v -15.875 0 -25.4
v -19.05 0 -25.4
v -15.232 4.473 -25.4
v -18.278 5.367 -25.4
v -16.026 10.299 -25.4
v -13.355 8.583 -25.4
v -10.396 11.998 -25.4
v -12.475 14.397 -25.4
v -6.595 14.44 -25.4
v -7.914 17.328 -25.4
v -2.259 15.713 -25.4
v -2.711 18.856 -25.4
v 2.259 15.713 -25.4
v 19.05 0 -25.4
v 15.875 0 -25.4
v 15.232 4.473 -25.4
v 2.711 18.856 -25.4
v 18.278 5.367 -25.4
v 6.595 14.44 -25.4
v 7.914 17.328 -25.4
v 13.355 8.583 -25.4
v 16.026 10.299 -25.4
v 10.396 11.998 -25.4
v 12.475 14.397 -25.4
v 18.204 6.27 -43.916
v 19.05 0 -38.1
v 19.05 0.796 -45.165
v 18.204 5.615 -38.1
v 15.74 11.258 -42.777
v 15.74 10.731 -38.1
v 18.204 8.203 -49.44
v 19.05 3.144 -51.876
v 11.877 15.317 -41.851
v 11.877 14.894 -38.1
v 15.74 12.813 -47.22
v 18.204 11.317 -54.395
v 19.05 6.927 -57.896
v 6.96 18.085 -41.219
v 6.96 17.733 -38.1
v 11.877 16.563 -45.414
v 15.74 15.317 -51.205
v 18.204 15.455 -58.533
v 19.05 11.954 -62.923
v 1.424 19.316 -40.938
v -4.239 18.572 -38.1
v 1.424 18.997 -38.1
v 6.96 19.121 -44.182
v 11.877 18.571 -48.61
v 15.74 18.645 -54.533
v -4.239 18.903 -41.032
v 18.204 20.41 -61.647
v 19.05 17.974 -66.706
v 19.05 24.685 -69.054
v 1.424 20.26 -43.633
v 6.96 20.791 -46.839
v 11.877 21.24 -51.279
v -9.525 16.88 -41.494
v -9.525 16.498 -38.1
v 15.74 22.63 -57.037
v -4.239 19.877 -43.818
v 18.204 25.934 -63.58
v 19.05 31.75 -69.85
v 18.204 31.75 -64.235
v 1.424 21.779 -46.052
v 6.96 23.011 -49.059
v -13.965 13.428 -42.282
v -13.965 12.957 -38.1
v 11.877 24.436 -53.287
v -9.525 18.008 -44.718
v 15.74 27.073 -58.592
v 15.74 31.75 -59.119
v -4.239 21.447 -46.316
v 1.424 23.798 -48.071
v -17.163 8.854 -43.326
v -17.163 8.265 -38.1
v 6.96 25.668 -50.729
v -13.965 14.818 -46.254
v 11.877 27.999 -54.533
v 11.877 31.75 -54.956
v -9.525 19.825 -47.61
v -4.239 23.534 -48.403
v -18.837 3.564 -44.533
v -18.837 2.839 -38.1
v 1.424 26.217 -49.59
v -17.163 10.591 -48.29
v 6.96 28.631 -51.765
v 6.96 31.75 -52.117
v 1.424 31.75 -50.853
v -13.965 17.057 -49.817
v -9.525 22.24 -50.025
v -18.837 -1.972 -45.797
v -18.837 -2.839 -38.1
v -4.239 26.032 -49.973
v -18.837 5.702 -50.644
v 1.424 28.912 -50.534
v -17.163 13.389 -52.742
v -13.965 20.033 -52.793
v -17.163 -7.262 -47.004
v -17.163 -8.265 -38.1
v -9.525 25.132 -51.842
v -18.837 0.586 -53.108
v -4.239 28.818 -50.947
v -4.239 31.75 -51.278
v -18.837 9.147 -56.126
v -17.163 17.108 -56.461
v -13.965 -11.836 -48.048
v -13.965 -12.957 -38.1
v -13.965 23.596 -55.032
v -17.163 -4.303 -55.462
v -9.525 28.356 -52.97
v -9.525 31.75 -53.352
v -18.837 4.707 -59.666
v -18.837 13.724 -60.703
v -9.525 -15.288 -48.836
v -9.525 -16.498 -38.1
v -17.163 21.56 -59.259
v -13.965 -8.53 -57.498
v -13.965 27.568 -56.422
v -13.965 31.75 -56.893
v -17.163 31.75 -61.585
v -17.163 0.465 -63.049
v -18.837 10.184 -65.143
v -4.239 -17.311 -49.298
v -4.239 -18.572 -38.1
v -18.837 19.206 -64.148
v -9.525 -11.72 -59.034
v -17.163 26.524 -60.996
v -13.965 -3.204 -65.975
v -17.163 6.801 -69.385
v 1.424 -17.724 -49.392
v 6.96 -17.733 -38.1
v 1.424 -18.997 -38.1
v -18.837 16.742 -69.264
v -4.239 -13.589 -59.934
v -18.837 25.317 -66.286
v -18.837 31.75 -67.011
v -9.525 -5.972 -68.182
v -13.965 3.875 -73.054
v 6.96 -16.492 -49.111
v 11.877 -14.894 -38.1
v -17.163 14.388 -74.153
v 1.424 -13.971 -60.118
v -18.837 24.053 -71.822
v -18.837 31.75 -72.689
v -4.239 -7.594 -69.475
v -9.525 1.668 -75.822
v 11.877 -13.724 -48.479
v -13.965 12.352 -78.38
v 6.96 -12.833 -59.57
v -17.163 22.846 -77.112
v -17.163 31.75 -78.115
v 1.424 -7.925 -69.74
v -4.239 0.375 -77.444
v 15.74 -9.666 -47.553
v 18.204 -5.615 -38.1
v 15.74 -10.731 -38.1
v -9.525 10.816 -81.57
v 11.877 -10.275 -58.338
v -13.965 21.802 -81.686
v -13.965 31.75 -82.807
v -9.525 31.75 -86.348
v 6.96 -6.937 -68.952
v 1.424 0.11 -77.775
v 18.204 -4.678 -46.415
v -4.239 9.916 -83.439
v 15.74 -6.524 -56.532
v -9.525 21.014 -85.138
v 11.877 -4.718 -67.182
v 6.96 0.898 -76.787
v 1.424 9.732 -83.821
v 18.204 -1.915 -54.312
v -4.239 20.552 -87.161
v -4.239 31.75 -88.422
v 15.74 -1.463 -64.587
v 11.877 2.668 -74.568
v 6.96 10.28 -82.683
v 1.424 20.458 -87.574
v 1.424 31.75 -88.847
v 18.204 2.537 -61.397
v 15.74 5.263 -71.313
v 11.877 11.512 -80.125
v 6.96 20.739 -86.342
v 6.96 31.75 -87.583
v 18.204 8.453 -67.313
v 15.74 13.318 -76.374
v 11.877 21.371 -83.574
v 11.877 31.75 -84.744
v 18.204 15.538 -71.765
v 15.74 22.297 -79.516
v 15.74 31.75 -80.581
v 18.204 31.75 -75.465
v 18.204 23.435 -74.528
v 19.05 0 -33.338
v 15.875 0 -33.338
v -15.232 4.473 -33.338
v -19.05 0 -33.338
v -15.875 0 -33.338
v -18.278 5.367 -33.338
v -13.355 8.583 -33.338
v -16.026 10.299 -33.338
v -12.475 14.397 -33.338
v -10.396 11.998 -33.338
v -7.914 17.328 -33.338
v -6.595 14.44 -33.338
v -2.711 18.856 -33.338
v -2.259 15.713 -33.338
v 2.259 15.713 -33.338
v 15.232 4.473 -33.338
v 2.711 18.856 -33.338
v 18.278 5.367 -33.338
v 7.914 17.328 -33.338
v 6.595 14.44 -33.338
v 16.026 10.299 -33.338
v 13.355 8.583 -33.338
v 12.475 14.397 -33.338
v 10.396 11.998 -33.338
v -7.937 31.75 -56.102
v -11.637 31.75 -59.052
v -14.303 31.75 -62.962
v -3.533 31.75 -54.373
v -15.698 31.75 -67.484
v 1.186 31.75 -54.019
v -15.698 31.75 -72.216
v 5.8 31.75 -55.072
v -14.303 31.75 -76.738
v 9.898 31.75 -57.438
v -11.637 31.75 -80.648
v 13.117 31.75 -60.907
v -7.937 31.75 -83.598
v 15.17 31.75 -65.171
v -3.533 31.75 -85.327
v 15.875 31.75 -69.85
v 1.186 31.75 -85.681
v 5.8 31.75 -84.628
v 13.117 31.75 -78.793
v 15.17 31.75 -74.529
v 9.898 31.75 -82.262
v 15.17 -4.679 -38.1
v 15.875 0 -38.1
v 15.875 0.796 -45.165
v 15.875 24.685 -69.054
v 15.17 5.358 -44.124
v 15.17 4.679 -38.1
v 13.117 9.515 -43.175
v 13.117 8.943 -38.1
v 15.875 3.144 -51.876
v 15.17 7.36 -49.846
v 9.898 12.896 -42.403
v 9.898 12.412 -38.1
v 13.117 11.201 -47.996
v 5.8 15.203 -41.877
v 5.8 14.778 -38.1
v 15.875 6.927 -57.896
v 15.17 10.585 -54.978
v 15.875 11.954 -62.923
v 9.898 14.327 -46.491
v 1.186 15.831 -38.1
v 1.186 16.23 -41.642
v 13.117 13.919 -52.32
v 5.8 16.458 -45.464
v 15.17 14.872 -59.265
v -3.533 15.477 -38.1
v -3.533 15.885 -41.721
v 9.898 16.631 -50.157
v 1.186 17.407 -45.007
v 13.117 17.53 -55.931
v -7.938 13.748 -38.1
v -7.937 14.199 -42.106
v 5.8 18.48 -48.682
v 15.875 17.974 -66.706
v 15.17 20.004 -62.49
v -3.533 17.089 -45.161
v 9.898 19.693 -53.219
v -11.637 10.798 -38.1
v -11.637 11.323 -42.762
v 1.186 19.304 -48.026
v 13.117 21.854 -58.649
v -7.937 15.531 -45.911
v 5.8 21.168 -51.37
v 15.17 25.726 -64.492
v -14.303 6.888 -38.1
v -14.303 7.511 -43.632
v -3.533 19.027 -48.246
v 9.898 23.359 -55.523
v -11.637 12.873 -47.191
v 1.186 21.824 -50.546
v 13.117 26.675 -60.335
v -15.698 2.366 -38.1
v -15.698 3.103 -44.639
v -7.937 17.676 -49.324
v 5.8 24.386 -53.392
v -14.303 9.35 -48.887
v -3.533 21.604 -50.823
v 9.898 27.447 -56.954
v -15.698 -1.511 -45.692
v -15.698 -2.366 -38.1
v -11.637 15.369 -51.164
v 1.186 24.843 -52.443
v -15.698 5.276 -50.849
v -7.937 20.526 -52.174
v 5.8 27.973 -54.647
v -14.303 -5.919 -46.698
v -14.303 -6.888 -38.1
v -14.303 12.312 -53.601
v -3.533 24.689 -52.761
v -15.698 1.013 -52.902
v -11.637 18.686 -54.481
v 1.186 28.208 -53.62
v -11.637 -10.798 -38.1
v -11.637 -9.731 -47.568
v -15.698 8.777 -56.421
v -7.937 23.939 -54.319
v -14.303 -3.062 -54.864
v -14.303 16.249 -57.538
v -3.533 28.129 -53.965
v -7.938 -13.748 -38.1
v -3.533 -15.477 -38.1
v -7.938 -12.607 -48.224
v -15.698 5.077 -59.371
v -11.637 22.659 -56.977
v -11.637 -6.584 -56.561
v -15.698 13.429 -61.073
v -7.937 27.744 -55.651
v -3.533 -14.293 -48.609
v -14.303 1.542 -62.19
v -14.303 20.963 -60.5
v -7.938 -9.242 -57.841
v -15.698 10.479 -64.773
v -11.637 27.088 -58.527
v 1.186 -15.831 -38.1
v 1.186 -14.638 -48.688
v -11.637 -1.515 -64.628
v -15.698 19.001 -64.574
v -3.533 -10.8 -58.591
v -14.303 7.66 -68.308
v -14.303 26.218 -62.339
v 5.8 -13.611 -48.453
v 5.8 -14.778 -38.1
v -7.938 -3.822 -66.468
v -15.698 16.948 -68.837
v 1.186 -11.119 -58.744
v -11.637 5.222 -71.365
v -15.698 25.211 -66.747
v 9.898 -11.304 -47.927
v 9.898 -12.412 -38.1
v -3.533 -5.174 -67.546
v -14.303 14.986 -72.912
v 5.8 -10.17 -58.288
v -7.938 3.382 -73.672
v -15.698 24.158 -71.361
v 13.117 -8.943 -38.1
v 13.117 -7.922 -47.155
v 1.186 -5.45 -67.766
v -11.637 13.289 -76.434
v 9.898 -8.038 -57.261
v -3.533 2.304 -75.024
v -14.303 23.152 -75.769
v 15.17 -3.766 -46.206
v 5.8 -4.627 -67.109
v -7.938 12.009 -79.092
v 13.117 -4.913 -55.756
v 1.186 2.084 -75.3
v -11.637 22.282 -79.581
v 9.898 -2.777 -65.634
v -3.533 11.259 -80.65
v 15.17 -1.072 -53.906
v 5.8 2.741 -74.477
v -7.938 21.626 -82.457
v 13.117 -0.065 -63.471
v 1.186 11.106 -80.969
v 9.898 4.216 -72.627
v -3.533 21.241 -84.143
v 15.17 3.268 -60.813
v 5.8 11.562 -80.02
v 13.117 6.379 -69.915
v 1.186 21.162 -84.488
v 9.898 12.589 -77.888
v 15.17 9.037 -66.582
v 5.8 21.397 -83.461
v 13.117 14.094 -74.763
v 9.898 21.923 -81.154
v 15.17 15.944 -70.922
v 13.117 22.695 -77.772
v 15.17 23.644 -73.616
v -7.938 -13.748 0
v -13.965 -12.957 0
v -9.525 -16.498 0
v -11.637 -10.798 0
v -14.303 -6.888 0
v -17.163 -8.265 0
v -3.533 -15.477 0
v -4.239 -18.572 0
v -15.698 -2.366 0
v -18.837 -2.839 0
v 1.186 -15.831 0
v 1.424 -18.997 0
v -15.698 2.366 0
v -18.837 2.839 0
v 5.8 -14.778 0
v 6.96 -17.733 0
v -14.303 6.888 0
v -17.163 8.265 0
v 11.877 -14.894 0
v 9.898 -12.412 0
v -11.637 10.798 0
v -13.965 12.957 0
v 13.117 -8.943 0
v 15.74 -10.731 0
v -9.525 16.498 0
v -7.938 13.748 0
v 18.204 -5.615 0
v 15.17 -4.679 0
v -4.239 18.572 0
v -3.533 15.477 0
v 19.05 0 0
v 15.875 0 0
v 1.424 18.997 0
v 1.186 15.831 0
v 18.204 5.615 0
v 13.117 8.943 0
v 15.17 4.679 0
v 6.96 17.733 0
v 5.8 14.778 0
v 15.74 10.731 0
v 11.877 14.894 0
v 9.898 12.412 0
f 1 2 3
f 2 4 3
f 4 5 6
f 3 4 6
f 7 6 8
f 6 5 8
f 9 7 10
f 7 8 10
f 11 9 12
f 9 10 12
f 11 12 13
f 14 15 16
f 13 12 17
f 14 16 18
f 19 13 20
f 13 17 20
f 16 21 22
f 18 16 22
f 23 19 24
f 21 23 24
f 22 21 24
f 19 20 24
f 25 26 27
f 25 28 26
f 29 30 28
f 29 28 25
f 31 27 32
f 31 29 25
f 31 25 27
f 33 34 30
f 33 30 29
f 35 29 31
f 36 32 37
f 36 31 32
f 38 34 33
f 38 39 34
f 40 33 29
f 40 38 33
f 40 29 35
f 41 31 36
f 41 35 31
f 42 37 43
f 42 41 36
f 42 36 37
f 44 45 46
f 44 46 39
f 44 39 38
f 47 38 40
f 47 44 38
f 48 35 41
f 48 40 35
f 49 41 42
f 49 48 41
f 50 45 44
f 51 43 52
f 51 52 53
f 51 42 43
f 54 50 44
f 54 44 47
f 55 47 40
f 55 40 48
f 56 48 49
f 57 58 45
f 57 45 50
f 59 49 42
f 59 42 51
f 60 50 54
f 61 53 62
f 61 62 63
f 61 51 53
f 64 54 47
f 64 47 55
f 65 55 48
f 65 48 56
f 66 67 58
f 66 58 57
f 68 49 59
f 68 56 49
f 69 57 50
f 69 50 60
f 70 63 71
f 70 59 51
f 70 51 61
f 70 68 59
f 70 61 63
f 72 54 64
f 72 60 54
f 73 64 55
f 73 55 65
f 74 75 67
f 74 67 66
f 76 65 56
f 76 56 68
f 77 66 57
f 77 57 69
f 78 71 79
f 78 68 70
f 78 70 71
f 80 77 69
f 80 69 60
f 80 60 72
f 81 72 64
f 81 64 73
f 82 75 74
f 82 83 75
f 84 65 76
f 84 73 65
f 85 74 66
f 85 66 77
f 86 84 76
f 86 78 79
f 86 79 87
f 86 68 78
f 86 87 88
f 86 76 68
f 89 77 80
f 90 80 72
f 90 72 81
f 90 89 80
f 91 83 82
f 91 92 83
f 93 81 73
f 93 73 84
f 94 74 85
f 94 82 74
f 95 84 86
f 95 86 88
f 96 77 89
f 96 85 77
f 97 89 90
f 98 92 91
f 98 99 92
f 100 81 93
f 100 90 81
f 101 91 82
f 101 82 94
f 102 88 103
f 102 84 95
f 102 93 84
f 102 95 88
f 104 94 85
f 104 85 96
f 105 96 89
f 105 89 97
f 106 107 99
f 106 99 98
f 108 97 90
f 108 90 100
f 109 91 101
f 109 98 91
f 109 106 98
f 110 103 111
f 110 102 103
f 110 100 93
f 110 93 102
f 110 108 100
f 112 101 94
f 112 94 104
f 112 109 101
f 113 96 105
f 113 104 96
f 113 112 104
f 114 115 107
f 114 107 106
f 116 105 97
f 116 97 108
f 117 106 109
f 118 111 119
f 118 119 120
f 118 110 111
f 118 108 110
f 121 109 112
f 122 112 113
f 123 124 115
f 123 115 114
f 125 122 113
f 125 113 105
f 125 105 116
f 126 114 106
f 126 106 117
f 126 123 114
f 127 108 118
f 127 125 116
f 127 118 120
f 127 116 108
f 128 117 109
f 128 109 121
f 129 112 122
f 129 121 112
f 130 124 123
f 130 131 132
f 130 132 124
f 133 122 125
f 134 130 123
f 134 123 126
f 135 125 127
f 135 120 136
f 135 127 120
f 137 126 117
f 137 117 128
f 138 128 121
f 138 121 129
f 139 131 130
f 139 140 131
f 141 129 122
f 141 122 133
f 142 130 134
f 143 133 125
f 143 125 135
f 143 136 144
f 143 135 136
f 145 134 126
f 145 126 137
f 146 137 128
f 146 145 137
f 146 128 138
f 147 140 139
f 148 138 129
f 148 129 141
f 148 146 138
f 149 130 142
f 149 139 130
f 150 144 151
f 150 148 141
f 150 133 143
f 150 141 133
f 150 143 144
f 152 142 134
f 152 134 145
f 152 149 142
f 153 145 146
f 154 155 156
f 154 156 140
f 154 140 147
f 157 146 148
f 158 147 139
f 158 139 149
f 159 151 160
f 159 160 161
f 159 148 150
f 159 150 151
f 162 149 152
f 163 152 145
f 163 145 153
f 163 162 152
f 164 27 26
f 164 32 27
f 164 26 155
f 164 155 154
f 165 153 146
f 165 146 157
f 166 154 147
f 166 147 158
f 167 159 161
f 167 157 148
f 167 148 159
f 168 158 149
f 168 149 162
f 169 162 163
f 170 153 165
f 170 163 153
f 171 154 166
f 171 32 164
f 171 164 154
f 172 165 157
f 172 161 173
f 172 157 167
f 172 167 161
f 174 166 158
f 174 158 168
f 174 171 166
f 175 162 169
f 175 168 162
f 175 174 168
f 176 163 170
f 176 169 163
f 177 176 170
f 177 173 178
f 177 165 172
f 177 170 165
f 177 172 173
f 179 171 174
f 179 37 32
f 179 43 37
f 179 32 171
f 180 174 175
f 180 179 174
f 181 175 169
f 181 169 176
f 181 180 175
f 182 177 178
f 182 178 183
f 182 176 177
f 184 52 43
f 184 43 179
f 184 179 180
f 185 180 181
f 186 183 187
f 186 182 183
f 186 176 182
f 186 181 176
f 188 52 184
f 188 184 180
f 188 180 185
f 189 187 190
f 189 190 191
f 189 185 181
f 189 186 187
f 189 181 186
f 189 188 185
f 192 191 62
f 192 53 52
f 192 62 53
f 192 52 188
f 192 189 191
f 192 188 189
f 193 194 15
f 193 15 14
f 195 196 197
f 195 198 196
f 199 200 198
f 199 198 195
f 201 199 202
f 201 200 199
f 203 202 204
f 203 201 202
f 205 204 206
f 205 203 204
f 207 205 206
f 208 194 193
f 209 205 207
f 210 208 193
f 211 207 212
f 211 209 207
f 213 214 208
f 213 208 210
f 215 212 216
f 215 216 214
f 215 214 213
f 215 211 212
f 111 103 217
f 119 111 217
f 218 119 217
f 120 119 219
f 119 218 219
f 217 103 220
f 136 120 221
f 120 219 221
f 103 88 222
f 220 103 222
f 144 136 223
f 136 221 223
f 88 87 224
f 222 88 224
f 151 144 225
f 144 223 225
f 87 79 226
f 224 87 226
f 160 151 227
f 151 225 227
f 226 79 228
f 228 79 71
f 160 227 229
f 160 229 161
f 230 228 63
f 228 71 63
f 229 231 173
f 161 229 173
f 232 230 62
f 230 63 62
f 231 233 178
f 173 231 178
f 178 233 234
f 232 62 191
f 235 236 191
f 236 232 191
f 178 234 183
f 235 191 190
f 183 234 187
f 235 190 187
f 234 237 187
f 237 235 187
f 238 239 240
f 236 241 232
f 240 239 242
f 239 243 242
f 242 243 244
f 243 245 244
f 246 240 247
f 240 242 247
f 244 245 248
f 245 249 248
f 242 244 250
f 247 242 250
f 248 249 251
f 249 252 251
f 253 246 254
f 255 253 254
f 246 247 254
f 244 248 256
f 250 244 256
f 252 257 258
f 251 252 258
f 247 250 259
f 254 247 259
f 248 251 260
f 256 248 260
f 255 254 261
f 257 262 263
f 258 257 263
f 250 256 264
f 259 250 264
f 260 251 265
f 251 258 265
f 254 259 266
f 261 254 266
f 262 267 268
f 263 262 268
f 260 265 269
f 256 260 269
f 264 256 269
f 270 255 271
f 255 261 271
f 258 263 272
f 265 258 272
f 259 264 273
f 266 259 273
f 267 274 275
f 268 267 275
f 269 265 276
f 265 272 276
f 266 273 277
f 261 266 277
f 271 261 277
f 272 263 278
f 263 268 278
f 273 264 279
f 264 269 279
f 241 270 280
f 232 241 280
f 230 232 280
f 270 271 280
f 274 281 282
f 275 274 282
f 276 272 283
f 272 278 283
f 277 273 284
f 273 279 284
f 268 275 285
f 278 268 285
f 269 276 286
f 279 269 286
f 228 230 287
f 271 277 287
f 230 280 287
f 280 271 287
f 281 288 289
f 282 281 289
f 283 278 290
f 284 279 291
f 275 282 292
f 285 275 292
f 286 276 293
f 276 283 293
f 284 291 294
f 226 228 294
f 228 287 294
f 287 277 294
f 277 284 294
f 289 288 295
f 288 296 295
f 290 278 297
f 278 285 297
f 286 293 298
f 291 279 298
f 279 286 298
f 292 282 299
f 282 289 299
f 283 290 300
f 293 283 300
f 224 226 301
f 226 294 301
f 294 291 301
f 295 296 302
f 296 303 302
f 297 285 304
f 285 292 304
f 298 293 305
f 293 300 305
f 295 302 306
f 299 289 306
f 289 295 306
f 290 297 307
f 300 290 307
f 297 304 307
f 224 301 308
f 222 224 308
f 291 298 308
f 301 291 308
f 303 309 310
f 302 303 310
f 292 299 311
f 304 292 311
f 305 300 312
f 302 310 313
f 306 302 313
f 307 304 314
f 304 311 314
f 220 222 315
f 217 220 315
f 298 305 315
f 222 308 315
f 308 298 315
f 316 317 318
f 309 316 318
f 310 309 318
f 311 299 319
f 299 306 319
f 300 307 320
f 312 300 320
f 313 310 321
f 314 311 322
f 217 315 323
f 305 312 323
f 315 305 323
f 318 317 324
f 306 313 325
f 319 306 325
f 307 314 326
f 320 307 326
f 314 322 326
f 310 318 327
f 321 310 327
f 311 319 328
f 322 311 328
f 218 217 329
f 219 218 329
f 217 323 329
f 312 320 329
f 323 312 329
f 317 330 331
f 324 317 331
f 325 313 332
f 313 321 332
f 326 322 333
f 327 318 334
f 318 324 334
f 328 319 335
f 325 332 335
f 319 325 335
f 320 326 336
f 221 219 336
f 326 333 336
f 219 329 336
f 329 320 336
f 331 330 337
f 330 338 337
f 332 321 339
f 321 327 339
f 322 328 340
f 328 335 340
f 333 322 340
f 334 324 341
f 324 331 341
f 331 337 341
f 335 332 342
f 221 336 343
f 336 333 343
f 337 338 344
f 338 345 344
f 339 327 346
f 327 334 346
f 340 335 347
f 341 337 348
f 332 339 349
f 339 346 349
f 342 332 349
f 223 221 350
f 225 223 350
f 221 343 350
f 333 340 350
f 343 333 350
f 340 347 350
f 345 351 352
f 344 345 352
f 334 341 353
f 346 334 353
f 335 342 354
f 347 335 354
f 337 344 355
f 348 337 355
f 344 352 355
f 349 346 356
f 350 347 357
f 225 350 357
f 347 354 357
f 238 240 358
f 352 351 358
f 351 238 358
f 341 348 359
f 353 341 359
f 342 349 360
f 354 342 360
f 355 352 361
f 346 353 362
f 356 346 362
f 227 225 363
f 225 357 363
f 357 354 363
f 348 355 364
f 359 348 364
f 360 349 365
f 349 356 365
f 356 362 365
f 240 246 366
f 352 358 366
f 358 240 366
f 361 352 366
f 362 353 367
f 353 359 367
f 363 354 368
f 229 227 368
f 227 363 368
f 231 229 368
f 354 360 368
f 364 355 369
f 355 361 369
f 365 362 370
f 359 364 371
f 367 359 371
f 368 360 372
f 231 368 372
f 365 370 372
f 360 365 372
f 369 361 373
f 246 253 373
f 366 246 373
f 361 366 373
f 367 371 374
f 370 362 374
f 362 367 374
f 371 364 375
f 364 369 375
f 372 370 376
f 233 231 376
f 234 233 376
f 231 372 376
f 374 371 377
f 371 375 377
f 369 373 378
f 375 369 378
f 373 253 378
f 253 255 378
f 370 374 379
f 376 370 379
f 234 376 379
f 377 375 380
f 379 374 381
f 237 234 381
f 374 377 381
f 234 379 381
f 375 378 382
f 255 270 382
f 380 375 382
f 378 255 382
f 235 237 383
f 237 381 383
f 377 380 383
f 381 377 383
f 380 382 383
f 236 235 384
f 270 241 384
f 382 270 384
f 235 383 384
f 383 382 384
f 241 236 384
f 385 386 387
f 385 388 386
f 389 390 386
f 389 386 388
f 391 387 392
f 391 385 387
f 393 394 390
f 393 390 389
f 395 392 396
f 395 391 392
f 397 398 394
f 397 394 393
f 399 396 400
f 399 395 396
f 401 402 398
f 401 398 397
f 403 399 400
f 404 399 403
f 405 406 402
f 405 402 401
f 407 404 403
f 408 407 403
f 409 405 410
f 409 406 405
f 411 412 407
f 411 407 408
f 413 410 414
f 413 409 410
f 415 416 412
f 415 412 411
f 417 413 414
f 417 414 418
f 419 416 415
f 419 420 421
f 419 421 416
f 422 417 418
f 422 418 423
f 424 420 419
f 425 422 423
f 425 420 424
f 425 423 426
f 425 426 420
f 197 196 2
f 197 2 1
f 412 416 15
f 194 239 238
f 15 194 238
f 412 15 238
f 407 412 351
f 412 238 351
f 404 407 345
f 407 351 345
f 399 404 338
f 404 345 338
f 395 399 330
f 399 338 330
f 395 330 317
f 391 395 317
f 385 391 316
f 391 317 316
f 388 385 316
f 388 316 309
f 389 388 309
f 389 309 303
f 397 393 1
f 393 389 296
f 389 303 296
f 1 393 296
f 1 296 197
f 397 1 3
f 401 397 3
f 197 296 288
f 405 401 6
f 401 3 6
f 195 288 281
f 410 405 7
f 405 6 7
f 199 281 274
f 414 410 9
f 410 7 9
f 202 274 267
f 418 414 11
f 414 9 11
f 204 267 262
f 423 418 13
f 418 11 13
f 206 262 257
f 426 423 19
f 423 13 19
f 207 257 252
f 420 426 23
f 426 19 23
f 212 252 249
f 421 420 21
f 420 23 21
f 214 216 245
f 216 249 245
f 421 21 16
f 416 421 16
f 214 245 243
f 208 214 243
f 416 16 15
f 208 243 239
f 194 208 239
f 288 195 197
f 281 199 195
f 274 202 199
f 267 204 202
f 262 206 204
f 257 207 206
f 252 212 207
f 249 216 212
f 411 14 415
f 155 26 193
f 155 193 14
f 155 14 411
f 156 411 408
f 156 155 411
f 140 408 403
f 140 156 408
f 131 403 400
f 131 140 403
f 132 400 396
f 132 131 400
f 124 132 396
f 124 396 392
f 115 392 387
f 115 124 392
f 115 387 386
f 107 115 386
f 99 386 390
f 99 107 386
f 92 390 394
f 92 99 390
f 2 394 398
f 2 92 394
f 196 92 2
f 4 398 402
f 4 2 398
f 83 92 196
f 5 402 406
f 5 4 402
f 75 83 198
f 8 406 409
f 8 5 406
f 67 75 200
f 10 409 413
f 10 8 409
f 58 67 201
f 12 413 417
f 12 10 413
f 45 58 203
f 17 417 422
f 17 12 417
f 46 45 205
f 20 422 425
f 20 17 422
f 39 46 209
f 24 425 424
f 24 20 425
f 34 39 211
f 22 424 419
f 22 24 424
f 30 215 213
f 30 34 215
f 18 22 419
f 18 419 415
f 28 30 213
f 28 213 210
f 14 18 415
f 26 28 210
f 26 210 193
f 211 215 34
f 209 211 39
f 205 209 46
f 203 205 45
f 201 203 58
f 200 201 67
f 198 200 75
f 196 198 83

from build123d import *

# Parameters (mm, degrees)
SKETCH1_R          = 19.05
SKETCH1_R_2        = 15.875
CUT_EXTRUDE1_START = -7.9375
CUT_EXTRUDE1_DEPTH = 7.9375


with BuildPart() as part:
    # Sweep1: sweep along a path in Sketch2
    with BuildLine(Plane(origin=(0, 0, 0), x_dir=(0, 0, -1), z_dir=(1, 0, 0))) as sweep1_path:
        Line((0, 0), (38.1, 0))
        ThreePointArc((38.1, 0), (60.550640303, 9.299359697), (69.85, 31.75))
    # Sketch1 → Sweep1 (sweep)
    with BuildSketch(Plane.XY):
        Circle(SKETCH1_R)
        Circle(SKETCH1_R_2, mode=Mode.SUBTRACT)
    sweep(path=sweep1_path.line)

    # Sketch3 → Cut-Extrude1 (cut)
    with BuildSketch(Plane.XY.offset(-25.4).offset(CUT_EXTRUDE1_START)):
        with BuildLine():
            Line((-19.05, 0), (-15.875, 0))
            ThreePointArc((-15.875, 0), (0, 15.875), (15.875, 0))
            Line((15.875, 0), (19.05, 0))
            ThreePointArc((19.05, 0), (0, 19.05), (-19.05, 0))
        make_face()
    extrude(amount=CUT_EXTRUDE1_DEPTH, mode=Mode.SUBTRACT)


solid = part.part
